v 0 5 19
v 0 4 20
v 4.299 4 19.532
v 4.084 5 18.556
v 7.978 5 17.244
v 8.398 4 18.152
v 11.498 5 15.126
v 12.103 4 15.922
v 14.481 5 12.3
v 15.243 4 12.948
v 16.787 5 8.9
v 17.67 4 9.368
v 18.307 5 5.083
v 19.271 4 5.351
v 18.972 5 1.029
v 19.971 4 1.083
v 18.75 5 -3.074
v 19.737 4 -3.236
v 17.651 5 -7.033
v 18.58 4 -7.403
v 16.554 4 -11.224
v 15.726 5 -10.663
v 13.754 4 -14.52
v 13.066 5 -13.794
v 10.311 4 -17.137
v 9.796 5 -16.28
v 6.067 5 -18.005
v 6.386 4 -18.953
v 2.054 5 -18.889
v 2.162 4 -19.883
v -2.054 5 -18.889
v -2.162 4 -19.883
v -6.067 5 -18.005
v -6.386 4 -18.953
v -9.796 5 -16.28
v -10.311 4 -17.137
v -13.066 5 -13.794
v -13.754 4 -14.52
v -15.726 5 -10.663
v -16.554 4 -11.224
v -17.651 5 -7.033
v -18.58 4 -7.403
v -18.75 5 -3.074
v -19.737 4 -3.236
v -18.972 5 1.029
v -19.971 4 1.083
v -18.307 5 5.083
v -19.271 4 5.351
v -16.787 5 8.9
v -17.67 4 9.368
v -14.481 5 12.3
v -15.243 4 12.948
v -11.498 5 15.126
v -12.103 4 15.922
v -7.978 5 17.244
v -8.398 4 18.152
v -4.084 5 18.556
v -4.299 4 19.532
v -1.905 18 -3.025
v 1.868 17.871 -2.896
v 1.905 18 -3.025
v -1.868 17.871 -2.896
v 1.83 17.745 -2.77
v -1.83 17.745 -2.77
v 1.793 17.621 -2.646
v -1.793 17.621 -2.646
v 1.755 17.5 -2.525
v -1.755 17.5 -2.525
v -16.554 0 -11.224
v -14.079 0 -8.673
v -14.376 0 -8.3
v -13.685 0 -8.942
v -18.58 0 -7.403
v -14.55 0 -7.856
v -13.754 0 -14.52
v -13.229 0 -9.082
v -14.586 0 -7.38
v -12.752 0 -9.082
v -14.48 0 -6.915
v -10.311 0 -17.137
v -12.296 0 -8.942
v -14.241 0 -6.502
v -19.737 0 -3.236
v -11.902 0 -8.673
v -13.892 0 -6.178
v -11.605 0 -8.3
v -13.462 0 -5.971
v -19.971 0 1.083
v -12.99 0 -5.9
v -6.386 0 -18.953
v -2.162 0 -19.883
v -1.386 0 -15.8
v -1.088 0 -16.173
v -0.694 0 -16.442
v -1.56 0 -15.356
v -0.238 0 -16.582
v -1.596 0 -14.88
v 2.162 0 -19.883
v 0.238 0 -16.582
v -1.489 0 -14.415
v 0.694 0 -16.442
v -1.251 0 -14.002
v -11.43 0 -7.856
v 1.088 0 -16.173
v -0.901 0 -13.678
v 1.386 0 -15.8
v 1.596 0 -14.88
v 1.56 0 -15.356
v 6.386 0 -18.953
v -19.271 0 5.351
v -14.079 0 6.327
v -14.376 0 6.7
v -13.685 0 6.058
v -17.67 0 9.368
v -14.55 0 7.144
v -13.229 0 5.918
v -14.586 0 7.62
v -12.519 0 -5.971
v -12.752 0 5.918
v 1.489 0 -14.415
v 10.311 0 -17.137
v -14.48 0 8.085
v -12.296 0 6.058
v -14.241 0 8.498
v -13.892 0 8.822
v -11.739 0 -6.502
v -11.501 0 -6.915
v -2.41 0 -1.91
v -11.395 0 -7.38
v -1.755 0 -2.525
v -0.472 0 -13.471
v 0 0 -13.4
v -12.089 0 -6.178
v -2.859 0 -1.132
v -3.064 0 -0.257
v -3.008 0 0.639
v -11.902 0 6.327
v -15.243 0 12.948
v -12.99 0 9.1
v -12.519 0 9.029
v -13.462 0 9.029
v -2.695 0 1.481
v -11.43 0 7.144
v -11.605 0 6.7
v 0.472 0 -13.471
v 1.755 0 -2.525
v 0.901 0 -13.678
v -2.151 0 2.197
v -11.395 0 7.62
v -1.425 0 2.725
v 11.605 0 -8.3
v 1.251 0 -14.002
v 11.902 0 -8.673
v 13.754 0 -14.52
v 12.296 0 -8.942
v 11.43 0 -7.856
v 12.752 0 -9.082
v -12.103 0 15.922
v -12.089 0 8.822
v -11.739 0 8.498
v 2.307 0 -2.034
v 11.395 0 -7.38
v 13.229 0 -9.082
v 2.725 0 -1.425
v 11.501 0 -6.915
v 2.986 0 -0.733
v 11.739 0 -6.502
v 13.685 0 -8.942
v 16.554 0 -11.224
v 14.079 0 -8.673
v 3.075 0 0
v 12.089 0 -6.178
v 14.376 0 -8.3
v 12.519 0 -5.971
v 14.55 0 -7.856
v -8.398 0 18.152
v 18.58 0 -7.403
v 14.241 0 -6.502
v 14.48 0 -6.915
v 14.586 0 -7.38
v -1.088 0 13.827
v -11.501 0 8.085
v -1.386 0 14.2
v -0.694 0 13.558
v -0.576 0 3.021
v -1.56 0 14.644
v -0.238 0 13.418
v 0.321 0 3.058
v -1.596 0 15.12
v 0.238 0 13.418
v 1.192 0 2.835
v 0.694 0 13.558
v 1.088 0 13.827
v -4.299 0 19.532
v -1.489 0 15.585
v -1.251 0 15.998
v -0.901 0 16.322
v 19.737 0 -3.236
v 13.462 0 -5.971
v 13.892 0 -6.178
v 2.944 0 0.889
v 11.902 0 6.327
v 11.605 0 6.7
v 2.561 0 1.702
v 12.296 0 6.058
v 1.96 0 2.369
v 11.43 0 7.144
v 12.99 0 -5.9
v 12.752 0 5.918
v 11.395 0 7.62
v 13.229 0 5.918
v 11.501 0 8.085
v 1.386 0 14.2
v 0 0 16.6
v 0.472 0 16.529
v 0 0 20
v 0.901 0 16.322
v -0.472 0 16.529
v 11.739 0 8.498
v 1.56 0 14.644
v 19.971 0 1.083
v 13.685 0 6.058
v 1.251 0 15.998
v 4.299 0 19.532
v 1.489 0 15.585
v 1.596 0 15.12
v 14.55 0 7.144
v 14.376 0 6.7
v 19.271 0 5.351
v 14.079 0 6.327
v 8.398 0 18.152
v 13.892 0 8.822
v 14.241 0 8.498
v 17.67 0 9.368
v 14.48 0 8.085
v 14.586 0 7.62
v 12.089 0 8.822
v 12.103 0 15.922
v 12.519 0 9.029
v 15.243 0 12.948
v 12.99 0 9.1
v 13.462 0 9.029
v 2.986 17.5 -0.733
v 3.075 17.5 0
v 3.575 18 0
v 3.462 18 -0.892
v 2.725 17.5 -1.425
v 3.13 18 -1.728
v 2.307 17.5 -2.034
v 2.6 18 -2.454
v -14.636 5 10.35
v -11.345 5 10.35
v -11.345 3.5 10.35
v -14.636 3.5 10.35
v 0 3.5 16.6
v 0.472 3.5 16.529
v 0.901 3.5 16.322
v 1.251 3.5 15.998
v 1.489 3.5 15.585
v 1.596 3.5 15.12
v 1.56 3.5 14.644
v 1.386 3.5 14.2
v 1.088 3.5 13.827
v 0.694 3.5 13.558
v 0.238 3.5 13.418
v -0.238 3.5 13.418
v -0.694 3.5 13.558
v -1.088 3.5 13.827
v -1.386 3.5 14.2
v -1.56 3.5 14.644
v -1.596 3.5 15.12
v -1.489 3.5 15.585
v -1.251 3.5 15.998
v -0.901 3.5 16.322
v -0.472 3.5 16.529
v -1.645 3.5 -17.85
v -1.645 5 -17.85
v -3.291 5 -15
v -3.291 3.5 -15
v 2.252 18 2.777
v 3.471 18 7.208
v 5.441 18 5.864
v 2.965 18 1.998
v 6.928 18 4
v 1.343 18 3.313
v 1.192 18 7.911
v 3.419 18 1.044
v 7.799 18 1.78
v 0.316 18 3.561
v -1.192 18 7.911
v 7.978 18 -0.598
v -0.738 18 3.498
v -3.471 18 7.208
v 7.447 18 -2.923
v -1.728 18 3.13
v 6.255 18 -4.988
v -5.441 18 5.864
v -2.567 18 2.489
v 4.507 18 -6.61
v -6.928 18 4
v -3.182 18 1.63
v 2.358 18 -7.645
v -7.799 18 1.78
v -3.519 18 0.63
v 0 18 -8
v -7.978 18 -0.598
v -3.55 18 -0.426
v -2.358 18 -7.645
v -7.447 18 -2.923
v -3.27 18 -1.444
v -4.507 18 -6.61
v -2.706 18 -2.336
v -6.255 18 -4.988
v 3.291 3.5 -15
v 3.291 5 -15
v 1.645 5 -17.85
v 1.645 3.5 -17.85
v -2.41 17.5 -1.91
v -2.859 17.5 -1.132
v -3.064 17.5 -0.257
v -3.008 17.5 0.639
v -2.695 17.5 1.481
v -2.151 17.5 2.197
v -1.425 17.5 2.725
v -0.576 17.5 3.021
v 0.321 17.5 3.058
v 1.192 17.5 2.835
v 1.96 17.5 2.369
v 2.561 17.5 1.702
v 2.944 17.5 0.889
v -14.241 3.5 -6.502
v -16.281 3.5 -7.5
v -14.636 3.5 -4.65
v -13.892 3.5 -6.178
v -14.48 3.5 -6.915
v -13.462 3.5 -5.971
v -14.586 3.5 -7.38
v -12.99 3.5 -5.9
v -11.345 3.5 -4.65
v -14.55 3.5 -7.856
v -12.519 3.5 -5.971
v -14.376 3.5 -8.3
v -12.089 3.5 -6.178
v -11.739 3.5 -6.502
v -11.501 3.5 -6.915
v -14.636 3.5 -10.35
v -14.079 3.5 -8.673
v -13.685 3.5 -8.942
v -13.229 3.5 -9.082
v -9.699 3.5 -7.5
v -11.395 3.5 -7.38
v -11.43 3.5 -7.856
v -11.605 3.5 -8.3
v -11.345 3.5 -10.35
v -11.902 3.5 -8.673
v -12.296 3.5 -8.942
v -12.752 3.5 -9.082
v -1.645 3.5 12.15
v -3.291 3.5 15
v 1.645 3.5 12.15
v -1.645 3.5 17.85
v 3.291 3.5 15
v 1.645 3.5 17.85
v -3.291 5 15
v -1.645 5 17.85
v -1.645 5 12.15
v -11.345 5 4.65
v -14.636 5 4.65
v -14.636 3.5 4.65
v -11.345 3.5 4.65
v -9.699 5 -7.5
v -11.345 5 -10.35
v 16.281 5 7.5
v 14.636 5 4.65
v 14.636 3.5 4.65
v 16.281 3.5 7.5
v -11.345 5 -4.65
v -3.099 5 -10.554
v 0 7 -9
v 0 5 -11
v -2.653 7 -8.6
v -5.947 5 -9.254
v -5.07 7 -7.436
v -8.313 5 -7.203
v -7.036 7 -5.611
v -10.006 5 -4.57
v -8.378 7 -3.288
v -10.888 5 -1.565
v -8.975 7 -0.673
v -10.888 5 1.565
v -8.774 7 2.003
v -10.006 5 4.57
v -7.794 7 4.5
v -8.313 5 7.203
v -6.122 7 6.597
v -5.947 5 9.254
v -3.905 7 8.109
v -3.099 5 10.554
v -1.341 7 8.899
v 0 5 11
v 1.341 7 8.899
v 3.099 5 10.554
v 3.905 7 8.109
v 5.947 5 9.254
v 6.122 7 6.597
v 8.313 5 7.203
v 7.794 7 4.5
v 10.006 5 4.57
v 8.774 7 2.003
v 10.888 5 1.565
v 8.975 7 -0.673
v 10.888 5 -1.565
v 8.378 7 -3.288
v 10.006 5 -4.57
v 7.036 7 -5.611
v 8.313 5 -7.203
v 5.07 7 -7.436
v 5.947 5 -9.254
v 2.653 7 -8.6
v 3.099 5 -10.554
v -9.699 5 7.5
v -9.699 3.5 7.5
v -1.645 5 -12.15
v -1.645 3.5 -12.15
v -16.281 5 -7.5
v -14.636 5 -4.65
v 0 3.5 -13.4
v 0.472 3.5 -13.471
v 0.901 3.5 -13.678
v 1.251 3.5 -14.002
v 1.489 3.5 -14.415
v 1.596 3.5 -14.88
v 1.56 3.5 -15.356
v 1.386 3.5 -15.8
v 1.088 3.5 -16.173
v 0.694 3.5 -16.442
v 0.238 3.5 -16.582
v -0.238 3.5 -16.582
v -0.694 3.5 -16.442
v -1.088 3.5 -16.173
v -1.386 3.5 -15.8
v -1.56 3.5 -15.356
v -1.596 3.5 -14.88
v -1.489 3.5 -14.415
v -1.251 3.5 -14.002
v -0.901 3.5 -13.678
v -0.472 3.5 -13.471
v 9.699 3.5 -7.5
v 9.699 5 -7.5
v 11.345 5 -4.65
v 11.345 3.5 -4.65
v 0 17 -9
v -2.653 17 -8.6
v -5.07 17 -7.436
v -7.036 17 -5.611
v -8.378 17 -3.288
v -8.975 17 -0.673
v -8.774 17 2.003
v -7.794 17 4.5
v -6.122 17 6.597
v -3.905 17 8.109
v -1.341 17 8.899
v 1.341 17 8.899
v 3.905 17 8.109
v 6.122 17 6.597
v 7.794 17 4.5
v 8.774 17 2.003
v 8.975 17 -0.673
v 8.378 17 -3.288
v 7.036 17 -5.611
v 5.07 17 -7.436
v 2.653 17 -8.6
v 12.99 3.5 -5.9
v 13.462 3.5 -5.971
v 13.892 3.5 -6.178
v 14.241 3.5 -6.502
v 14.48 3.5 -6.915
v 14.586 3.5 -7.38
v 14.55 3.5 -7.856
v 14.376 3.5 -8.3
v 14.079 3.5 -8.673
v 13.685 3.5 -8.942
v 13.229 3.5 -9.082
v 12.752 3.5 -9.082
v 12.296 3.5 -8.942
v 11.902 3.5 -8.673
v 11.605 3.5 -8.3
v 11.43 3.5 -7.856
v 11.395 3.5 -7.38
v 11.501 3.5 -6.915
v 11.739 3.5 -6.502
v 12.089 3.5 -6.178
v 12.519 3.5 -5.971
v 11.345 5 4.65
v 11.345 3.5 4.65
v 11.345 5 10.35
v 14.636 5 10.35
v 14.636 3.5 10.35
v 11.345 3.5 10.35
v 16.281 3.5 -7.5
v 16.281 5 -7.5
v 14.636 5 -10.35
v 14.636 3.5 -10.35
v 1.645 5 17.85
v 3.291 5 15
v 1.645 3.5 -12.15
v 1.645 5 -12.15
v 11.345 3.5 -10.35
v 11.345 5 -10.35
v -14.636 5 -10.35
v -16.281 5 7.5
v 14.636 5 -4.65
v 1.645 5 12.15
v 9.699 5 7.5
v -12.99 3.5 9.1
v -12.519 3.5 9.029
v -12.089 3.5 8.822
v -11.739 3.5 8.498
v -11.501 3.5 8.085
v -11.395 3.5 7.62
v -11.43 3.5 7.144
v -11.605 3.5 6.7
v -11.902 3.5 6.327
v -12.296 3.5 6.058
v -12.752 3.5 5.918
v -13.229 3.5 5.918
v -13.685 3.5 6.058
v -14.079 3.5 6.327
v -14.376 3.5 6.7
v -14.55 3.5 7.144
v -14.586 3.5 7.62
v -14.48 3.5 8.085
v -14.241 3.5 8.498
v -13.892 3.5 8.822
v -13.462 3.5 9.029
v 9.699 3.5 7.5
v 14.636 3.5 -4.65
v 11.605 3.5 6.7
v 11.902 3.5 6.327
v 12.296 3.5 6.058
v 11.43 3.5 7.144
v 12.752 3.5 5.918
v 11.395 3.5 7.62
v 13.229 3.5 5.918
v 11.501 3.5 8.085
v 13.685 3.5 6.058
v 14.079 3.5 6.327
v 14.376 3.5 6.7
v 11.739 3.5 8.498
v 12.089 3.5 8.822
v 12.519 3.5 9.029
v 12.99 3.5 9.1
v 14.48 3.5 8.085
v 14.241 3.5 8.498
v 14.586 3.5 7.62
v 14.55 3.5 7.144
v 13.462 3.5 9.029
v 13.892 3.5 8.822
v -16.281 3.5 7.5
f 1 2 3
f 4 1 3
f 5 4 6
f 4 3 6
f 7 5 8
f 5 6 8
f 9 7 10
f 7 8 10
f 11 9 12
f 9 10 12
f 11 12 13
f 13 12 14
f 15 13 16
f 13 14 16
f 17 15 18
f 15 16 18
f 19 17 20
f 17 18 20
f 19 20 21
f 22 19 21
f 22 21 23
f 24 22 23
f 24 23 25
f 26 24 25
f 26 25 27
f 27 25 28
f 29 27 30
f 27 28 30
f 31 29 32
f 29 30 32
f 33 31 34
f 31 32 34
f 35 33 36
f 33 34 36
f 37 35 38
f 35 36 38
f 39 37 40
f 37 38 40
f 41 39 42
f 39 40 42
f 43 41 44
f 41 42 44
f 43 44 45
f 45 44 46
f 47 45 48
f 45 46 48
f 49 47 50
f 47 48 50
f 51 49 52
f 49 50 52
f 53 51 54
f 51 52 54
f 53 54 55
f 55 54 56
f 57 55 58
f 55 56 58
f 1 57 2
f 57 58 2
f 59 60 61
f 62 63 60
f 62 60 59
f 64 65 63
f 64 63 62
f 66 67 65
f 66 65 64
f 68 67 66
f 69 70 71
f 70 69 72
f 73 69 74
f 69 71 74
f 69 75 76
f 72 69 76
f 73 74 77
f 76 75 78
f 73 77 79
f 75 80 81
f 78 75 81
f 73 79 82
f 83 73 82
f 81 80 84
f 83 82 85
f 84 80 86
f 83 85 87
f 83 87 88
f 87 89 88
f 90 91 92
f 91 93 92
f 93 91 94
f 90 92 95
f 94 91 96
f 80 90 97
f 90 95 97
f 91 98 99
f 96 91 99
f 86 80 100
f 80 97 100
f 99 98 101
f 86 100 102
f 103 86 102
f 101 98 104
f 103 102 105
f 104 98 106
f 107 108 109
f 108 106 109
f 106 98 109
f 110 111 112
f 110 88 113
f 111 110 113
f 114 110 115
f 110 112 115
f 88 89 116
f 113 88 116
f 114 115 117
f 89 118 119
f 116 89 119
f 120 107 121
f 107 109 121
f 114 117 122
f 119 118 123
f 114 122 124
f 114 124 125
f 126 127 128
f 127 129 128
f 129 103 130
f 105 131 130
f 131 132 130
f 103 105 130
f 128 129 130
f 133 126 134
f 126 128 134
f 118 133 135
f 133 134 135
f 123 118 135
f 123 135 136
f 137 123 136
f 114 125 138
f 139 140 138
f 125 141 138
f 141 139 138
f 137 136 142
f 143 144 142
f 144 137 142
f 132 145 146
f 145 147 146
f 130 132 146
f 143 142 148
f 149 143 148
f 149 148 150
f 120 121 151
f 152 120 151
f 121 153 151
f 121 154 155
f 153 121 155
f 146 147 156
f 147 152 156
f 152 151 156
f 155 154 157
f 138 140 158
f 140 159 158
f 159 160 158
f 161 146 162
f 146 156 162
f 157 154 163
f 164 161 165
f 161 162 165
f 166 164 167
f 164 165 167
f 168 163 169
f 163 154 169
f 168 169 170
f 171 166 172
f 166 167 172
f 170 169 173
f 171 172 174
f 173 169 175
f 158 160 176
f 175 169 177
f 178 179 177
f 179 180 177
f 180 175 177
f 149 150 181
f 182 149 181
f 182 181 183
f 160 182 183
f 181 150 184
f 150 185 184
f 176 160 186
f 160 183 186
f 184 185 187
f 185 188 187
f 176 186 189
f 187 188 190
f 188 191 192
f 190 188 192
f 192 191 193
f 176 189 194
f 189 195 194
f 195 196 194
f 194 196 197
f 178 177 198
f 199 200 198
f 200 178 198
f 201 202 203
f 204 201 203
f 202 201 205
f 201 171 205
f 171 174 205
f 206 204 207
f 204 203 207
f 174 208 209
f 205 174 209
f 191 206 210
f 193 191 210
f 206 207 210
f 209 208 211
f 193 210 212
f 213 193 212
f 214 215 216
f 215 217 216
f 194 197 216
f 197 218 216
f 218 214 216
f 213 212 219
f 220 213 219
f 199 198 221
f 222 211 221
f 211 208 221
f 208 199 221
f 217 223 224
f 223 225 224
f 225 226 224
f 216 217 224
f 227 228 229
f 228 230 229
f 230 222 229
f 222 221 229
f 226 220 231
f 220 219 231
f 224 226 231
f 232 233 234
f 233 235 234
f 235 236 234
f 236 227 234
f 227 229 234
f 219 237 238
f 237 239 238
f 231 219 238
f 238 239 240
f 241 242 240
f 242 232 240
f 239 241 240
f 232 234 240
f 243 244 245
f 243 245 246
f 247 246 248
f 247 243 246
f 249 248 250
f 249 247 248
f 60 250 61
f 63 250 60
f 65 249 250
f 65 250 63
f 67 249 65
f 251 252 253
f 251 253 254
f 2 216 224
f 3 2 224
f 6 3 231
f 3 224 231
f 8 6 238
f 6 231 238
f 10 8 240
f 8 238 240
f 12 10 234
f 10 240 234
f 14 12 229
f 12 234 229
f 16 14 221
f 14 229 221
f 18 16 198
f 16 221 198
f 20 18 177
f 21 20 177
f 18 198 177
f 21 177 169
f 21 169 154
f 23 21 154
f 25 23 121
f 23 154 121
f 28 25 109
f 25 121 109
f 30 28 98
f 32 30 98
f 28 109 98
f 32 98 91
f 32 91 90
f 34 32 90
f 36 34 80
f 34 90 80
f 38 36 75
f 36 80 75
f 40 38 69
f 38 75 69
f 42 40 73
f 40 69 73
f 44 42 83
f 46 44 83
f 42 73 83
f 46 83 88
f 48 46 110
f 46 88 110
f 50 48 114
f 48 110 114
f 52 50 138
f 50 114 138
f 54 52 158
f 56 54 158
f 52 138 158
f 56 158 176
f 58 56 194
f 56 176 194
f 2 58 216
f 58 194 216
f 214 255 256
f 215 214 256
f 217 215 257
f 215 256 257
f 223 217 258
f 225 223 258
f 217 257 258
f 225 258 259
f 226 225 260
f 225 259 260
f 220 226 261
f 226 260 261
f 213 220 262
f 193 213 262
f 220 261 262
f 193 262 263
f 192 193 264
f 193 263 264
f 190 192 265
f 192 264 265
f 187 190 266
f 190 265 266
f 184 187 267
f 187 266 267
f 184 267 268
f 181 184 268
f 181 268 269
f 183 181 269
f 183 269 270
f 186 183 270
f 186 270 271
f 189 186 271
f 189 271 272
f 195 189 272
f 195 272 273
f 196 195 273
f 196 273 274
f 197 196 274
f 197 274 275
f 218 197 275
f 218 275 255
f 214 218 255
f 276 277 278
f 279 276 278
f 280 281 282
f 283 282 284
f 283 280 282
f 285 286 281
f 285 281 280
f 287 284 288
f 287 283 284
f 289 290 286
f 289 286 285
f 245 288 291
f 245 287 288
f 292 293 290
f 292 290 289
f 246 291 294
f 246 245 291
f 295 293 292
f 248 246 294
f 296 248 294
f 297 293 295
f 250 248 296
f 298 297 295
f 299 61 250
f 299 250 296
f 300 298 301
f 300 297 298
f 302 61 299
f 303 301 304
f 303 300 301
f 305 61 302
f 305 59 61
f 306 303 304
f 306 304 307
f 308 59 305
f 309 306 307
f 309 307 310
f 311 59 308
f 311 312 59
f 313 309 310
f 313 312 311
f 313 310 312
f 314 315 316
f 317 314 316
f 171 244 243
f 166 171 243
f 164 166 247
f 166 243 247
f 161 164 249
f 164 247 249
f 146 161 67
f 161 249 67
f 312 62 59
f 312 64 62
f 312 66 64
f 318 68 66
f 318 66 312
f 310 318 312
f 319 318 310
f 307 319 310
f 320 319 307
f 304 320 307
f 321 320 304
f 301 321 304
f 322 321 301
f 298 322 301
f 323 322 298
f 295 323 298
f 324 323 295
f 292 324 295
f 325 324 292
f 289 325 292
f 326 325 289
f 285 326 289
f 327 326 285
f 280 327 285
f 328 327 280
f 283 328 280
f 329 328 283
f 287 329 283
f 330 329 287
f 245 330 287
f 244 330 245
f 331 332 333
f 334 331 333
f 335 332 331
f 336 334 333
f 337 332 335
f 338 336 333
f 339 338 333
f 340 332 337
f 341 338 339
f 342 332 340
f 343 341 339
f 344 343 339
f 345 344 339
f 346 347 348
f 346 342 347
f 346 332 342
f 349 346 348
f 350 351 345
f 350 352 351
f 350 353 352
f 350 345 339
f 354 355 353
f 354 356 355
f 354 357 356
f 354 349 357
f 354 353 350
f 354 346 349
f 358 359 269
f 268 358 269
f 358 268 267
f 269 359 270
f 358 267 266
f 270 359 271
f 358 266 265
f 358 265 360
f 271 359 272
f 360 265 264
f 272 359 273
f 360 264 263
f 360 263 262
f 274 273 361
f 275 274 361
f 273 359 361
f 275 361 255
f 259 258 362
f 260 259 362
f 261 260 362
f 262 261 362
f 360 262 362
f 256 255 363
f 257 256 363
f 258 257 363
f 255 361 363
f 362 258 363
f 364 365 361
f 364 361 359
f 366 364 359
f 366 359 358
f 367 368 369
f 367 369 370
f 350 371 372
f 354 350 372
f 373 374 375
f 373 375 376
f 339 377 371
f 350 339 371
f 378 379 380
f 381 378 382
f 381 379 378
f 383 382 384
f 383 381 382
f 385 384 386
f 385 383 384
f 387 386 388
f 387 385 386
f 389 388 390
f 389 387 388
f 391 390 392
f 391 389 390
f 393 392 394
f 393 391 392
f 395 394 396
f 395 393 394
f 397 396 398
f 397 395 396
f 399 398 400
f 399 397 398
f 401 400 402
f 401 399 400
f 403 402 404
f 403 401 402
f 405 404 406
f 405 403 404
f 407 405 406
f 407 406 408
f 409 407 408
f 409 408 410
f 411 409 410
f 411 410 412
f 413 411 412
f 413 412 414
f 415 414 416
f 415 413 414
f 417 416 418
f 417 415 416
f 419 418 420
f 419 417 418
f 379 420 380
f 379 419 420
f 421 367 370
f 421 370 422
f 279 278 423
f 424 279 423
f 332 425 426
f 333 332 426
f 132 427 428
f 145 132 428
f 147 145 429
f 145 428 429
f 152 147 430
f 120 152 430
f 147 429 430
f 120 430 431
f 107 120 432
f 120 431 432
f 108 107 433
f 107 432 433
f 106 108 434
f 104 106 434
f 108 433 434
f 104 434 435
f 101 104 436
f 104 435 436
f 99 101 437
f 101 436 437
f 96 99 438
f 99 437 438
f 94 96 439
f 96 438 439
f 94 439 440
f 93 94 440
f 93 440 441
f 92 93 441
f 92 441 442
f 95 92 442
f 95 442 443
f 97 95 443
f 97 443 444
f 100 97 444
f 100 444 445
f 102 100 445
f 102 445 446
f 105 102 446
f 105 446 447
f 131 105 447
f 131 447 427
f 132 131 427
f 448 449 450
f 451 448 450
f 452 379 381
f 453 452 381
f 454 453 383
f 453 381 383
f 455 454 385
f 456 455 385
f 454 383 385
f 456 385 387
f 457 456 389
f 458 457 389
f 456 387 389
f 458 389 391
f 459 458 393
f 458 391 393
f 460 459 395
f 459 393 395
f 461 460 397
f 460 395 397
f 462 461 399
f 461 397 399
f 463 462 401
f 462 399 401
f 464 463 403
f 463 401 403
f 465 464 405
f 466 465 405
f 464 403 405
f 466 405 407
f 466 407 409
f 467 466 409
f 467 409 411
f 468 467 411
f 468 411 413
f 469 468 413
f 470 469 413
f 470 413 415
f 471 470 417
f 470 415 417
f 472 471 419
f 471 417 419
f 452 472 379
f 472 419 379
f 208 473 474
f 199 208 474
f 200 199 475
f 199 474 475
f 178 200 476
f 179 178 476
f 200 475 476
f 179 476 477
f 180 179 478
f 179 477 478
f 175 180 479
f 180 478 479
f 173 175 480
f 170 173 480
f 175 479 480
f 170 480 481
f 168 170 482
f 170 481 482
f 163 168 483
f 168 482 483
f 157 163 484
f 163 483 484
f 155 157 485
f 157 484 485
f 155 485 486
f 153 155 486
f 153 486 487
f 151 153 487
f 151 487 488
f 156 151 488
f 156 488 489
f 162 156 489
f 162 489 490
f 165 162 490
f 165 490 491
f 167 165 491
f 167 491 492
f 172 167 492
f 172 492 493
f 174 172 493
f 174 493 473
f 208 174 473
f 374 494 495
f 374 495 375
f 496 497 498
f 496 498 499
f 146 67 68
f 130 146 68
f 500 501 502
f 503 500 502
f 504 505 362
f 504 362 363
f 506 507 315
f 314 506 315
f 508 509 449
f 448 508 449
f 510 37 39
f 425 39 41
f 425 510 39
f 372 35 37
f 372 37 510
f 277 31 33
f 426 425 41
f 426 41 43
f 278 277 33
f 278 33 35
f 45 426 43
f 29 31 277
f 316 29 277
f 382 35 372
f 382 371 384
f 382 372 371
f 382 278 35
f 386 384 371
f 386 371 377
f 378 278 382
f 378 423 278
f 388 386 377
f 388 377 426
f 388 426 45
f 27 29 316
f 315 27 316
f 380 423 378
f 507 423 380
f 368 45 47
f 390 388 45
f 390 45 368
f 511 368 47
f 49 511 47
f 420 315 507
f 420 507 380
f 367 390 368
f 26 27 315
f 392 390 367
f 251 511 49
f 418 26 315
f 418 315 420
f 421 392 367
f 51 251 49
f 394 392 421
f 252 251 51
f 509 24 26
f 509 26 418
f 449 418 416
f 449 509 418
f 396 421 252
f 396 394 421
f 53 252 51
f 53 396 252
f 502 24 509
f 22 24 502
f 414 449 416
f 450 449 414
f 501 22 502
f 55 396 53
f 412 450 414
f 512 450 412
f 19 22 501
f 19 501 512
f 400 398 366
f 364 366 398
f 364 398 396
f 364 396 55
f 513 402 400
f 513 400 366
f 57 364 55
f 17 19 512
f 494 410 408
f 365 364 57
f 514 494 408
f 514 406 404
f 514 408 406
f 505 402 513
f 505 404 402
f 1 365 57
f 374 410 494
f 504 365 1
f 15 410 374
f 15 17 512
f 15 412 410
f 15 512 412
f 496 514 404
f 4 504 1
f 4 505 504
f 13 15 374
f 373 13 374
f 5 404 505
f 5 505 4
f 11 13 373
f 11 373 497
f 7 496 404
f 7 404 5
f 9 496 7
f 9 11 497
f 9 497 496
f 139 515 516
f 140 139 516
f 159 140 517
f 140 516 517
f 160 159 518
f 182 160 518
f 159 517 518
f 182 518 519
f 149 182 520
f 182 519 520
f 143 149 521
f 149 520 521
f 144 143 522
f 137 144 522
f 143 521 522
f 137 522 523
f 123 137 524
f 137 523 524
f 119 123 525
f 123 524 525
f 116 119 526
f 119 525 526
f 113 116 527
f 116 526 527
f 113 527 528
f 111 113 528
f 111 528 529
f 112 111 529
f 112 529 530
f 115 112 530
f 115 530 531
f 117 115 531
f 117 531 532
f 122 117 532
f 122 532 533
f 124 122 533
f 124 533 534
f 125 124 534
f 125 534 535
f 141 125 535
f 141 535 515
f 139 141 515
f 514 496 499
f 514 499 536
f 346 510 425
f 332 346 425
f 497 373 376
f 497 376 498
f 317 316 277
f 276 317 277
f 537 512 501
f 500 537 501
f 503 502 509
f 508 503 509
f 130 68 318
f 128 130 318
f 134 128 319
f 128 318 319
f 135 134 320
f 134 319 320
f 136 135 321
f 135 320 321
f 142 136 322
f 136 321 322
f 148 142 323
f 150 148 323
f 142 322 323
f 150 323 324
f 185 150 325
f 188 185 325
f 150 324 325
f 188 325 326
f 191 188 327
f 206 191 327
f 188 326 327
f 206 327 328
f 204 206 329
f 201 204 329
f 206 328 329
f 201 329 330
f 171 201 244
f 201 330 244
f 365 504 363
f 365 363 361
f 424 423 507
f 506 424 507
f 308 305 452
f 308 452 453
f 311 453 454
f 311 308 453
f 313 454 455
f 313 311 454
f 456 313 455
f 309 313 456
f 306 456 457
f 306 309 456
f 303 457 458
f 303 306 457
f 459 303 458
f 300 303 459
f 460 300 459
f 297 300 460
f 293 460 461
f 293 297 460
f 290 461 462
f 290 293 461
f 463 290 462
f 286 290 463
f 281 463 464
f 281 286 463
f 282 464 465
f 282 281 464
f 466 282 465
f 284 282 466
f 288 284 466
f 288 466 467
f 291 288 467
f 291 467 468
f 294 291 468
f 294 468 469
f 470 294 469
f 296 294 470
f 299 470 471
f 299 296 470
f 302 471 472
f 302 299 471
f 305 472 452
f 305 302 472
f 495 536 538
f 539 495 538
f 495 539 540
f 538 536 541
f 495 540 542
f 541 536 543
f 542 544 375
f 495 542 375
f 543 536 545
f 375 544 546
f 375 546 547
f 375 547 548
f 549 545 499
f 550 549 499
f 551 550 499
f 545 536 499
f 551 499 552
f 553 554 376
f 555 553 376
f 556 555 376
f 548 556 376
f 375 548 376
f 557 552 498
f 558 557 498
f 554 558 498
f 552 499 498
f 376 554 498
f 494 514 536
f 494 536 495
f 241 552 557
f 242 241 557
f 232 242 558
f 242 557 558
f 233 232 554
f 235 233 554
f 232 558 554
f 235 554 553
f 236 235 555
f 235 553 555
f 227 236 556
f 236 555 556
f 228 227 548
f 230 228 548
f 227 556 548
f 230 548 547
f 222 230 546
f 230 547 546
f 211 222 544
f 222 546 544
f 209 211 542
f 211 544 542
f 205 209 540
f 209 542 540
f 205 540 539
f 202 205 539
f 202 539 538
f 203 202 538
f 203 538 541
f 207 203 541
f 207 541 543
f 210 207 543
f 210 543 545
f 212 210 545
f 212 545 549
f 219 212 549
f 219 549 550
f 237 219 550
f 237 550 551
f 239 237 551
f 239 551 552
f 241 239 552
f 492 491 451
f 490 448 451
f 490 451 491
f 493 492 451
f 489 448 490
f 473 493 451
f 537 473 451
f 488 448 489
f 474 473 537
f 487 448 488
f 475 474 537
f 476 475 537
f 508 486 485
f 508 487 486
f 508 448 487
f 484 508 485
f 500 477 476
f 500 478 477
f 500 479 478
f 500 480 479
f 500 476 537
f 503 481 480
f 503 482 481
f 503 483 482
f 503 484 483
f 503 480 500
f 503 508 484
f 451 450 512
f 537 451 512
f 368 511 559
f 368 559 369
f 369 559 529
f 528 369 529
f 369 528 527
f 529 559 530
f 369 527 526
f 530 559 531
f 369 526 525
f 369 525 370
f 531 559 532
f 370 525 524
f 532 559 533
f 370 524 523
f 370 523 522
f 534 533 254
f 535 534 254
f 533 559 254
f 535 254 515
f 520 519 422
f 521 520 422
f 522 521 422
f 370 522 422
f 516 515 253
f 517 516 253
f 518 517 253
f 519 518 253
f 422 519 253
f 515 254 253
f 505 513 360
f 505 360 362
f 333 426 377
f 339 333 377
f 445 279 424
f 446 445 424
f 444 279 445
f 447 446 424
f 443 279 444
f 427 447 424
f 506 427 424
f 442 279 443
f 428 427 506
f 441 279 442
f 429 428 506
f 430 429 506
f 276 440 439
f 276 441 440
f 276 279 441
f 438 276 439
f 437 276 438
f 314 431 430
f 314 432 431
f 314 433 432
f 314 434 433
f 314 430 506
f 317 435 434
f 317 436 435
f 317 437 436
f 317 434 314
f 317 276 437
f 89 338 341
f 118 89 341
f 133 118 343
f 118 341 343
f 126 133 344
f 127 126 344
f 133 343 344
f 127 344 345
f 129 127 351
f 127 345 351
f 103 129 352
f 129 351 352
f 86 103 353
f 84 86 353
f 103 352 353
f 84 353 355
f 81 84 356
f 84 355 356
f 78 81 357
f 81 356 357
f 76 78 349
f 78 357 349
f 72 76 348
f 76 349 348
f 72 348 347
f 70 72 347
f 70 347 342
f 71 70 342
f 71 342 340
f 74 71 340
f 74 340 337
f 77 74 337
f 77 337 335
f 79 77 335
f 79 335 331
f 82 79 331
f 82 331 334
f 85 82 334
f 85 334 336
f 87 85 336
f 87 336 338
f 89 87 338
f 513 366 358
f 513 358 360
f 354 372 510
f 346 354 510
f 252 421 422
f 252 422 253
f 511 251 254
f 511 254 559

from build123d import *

# Parameters (mm, degrees)
SKETCH1_R           = 20
BOSS_EXTRUDE1_DEPTH = 5
SKETCH2_R           = 1.6
CUT_EXTRUDE1_DEPTH  = 29.722813233
SKETCH3_R           = 9
BOSS_EXTRUDE2_DEPTH = 13
CUT_EXTRUDE2_DEPTH  = 34.526109228
CHAMFER3_SIZE       = 2
CHAMFER4_SIZE       = 1
CHAMFER5_SIZE       = 1
CHAMFER6_SIZE       = 0.5
CUT_EXTRUDE7_DEPTH  = 1.5


with BuildPart() as part:
    # Sketch1 → Boss-Extrude1 (new body)
    with BuildSketch(Plane(origin=(0, 0, 0), x_dir=(1, 0, 0), z_dir=(0, 1, 0))):
        with Locations(Location((0, 0, 0), (0, 0, 270))):
            Circle(SKETCH1_R)
    extrude(amount=BOSS_EXTRUDE1_DEPTH)

    # Sketch2 → Cut-Extrude1 (cut, through all)
    with BuildSketch(Plane(origin=(0, 5, 0), x_dir=(1, 0, 0), z_dir=(0, 1, 0))):
        with Locations(Location((0, 15, 0), (0, 0, 270))):
            Circle(SKETCH2_R)
        with Locations(Location((12.990381057, 7.5, 0), (0, 0, 270))):
            Circle(SKETCH2_R)
        with Locations(Location((12.990381057, -7.5, 0), (0, 0, 270))):
            Circle(SKETCH2_R)
        with Locations(Location((0, -15, 0), (0, 0, 270))):
            Circle(SKETCH2_R)
        with Locations(Location((-12.990381057, -7.5, 0), (0, 0, 270))):
            Circle(SKETCH2_R)
        with Locations(Location((-12.990381057, 7.5, 0), (0, 0, 270))):
            Circle(SKETCH2_R)
    extrude(amount=-CUT_EXTRUDE1_DEPTH, mode=Mode.SUBTRACT)

    # Sketch3 → Boss-Extrude2 (add)
    with BuildSketch(Plane(origin=(0, 5, 0), x_dir=(1, 0, 0), z_dir=(0, 1, 0))):
        with Locations(Location((0, 0, 0), (0, 0, 90))):
            Circle(SKETCH3_R)
    extrude(amount=BOSS_EXTRUDE2_DEPTH)

    # Sketch4 → Cut-Extrude2 (cut, through all)
    with BuildSketch(Plane(origin=(0, 18, 0), x_dir=(1, 0, 0), z_dir=(0, 1, 0))):
        with BuildLine():
            Line((1.754992877, 2.525), (-1.754992877, 2.525))
            ThreePointArc((-1.754992877, 2.525), (-1.424609052, -2.725089732), (3.075, 0))
            ThreePointArc((3.075, 0), (2.725089732, 1.424609052), (1.754992877, 2.525))
        make_face()
    extrude(amount=-CUT_EXTRUDE2_DEPTH, mode=Mode.SUBTRACT)

    # Chamfer3
    chamfer3_edges = [part.edges().sort_by_distance(p)[0] for p in [
        (0, 5, 9),
    ]]
    chamfer(chamfer3_edges, length=CHAMFER3_SIZE)

    # Chamfer4
    chamfer4_edges = [part.edges().sort_by_distance(p)[0] for p in [
        (0, 5, -20),
    ]]
    chamfer(chamfer4_edges, length=CHAMFER4_SIZE)

    # Chamfer5
    chamfer5_edges = [part.edges().sort_by_distance(p)[0] for p in [
        (0, 18, 9),
    ]]
    chamfer(chamfer5_edges, length=CHAMFER5_SIZE)

    # Chamfer6
    chamfer6_edges = [part.edges().sort_by_distance(p)[0] for p in [
        (0, 18, -2.525),
        (0, 18, 3.075),
    ]]
    chamfer(chamfer6_edges, length=CHAMFER6_SIZE)

    # Sketch10 → Cut-Extrude7 (cut)
    with BuildSketch(Plane(origin=(0, 5, 0), x_dir=(1, 0, 0), z_dir=(0, 1, 0))):
        Polygon((1.645448267, 17.85), (-1.645448267, 17.85), (-3.290896534, 15), (-1.645448267, 12.15), (1.645448267, 12.15), (3.290896534, 15), align=None)
        Polygon((14.635829324, 10.35), (11.34493279, 10.35), (9.699484522, 7.5), (11.34493279, 4.65), (14.635829324, 4.65), (16.281277591, 7.5), align=None)
        Polygon((-11.34493279, 10.35), (-14.635829324, 10.35), (-16.281277591, 7.5), (-14.635829324, 4.65), (-11.34493279, 4.65), (-9.699484522, 7.5), align=None)
    cut_extrude7 = extrude(amount=-CUT_EXTRUDE7_DEPTH, mode=Mode.SUBTRACT)

    # Mirror2: Cut-Extrude7 across plane
    add(cut_extrude7.mirror(Plane.XY), mode=Mode.SUBTRACT)


solid = part.part
